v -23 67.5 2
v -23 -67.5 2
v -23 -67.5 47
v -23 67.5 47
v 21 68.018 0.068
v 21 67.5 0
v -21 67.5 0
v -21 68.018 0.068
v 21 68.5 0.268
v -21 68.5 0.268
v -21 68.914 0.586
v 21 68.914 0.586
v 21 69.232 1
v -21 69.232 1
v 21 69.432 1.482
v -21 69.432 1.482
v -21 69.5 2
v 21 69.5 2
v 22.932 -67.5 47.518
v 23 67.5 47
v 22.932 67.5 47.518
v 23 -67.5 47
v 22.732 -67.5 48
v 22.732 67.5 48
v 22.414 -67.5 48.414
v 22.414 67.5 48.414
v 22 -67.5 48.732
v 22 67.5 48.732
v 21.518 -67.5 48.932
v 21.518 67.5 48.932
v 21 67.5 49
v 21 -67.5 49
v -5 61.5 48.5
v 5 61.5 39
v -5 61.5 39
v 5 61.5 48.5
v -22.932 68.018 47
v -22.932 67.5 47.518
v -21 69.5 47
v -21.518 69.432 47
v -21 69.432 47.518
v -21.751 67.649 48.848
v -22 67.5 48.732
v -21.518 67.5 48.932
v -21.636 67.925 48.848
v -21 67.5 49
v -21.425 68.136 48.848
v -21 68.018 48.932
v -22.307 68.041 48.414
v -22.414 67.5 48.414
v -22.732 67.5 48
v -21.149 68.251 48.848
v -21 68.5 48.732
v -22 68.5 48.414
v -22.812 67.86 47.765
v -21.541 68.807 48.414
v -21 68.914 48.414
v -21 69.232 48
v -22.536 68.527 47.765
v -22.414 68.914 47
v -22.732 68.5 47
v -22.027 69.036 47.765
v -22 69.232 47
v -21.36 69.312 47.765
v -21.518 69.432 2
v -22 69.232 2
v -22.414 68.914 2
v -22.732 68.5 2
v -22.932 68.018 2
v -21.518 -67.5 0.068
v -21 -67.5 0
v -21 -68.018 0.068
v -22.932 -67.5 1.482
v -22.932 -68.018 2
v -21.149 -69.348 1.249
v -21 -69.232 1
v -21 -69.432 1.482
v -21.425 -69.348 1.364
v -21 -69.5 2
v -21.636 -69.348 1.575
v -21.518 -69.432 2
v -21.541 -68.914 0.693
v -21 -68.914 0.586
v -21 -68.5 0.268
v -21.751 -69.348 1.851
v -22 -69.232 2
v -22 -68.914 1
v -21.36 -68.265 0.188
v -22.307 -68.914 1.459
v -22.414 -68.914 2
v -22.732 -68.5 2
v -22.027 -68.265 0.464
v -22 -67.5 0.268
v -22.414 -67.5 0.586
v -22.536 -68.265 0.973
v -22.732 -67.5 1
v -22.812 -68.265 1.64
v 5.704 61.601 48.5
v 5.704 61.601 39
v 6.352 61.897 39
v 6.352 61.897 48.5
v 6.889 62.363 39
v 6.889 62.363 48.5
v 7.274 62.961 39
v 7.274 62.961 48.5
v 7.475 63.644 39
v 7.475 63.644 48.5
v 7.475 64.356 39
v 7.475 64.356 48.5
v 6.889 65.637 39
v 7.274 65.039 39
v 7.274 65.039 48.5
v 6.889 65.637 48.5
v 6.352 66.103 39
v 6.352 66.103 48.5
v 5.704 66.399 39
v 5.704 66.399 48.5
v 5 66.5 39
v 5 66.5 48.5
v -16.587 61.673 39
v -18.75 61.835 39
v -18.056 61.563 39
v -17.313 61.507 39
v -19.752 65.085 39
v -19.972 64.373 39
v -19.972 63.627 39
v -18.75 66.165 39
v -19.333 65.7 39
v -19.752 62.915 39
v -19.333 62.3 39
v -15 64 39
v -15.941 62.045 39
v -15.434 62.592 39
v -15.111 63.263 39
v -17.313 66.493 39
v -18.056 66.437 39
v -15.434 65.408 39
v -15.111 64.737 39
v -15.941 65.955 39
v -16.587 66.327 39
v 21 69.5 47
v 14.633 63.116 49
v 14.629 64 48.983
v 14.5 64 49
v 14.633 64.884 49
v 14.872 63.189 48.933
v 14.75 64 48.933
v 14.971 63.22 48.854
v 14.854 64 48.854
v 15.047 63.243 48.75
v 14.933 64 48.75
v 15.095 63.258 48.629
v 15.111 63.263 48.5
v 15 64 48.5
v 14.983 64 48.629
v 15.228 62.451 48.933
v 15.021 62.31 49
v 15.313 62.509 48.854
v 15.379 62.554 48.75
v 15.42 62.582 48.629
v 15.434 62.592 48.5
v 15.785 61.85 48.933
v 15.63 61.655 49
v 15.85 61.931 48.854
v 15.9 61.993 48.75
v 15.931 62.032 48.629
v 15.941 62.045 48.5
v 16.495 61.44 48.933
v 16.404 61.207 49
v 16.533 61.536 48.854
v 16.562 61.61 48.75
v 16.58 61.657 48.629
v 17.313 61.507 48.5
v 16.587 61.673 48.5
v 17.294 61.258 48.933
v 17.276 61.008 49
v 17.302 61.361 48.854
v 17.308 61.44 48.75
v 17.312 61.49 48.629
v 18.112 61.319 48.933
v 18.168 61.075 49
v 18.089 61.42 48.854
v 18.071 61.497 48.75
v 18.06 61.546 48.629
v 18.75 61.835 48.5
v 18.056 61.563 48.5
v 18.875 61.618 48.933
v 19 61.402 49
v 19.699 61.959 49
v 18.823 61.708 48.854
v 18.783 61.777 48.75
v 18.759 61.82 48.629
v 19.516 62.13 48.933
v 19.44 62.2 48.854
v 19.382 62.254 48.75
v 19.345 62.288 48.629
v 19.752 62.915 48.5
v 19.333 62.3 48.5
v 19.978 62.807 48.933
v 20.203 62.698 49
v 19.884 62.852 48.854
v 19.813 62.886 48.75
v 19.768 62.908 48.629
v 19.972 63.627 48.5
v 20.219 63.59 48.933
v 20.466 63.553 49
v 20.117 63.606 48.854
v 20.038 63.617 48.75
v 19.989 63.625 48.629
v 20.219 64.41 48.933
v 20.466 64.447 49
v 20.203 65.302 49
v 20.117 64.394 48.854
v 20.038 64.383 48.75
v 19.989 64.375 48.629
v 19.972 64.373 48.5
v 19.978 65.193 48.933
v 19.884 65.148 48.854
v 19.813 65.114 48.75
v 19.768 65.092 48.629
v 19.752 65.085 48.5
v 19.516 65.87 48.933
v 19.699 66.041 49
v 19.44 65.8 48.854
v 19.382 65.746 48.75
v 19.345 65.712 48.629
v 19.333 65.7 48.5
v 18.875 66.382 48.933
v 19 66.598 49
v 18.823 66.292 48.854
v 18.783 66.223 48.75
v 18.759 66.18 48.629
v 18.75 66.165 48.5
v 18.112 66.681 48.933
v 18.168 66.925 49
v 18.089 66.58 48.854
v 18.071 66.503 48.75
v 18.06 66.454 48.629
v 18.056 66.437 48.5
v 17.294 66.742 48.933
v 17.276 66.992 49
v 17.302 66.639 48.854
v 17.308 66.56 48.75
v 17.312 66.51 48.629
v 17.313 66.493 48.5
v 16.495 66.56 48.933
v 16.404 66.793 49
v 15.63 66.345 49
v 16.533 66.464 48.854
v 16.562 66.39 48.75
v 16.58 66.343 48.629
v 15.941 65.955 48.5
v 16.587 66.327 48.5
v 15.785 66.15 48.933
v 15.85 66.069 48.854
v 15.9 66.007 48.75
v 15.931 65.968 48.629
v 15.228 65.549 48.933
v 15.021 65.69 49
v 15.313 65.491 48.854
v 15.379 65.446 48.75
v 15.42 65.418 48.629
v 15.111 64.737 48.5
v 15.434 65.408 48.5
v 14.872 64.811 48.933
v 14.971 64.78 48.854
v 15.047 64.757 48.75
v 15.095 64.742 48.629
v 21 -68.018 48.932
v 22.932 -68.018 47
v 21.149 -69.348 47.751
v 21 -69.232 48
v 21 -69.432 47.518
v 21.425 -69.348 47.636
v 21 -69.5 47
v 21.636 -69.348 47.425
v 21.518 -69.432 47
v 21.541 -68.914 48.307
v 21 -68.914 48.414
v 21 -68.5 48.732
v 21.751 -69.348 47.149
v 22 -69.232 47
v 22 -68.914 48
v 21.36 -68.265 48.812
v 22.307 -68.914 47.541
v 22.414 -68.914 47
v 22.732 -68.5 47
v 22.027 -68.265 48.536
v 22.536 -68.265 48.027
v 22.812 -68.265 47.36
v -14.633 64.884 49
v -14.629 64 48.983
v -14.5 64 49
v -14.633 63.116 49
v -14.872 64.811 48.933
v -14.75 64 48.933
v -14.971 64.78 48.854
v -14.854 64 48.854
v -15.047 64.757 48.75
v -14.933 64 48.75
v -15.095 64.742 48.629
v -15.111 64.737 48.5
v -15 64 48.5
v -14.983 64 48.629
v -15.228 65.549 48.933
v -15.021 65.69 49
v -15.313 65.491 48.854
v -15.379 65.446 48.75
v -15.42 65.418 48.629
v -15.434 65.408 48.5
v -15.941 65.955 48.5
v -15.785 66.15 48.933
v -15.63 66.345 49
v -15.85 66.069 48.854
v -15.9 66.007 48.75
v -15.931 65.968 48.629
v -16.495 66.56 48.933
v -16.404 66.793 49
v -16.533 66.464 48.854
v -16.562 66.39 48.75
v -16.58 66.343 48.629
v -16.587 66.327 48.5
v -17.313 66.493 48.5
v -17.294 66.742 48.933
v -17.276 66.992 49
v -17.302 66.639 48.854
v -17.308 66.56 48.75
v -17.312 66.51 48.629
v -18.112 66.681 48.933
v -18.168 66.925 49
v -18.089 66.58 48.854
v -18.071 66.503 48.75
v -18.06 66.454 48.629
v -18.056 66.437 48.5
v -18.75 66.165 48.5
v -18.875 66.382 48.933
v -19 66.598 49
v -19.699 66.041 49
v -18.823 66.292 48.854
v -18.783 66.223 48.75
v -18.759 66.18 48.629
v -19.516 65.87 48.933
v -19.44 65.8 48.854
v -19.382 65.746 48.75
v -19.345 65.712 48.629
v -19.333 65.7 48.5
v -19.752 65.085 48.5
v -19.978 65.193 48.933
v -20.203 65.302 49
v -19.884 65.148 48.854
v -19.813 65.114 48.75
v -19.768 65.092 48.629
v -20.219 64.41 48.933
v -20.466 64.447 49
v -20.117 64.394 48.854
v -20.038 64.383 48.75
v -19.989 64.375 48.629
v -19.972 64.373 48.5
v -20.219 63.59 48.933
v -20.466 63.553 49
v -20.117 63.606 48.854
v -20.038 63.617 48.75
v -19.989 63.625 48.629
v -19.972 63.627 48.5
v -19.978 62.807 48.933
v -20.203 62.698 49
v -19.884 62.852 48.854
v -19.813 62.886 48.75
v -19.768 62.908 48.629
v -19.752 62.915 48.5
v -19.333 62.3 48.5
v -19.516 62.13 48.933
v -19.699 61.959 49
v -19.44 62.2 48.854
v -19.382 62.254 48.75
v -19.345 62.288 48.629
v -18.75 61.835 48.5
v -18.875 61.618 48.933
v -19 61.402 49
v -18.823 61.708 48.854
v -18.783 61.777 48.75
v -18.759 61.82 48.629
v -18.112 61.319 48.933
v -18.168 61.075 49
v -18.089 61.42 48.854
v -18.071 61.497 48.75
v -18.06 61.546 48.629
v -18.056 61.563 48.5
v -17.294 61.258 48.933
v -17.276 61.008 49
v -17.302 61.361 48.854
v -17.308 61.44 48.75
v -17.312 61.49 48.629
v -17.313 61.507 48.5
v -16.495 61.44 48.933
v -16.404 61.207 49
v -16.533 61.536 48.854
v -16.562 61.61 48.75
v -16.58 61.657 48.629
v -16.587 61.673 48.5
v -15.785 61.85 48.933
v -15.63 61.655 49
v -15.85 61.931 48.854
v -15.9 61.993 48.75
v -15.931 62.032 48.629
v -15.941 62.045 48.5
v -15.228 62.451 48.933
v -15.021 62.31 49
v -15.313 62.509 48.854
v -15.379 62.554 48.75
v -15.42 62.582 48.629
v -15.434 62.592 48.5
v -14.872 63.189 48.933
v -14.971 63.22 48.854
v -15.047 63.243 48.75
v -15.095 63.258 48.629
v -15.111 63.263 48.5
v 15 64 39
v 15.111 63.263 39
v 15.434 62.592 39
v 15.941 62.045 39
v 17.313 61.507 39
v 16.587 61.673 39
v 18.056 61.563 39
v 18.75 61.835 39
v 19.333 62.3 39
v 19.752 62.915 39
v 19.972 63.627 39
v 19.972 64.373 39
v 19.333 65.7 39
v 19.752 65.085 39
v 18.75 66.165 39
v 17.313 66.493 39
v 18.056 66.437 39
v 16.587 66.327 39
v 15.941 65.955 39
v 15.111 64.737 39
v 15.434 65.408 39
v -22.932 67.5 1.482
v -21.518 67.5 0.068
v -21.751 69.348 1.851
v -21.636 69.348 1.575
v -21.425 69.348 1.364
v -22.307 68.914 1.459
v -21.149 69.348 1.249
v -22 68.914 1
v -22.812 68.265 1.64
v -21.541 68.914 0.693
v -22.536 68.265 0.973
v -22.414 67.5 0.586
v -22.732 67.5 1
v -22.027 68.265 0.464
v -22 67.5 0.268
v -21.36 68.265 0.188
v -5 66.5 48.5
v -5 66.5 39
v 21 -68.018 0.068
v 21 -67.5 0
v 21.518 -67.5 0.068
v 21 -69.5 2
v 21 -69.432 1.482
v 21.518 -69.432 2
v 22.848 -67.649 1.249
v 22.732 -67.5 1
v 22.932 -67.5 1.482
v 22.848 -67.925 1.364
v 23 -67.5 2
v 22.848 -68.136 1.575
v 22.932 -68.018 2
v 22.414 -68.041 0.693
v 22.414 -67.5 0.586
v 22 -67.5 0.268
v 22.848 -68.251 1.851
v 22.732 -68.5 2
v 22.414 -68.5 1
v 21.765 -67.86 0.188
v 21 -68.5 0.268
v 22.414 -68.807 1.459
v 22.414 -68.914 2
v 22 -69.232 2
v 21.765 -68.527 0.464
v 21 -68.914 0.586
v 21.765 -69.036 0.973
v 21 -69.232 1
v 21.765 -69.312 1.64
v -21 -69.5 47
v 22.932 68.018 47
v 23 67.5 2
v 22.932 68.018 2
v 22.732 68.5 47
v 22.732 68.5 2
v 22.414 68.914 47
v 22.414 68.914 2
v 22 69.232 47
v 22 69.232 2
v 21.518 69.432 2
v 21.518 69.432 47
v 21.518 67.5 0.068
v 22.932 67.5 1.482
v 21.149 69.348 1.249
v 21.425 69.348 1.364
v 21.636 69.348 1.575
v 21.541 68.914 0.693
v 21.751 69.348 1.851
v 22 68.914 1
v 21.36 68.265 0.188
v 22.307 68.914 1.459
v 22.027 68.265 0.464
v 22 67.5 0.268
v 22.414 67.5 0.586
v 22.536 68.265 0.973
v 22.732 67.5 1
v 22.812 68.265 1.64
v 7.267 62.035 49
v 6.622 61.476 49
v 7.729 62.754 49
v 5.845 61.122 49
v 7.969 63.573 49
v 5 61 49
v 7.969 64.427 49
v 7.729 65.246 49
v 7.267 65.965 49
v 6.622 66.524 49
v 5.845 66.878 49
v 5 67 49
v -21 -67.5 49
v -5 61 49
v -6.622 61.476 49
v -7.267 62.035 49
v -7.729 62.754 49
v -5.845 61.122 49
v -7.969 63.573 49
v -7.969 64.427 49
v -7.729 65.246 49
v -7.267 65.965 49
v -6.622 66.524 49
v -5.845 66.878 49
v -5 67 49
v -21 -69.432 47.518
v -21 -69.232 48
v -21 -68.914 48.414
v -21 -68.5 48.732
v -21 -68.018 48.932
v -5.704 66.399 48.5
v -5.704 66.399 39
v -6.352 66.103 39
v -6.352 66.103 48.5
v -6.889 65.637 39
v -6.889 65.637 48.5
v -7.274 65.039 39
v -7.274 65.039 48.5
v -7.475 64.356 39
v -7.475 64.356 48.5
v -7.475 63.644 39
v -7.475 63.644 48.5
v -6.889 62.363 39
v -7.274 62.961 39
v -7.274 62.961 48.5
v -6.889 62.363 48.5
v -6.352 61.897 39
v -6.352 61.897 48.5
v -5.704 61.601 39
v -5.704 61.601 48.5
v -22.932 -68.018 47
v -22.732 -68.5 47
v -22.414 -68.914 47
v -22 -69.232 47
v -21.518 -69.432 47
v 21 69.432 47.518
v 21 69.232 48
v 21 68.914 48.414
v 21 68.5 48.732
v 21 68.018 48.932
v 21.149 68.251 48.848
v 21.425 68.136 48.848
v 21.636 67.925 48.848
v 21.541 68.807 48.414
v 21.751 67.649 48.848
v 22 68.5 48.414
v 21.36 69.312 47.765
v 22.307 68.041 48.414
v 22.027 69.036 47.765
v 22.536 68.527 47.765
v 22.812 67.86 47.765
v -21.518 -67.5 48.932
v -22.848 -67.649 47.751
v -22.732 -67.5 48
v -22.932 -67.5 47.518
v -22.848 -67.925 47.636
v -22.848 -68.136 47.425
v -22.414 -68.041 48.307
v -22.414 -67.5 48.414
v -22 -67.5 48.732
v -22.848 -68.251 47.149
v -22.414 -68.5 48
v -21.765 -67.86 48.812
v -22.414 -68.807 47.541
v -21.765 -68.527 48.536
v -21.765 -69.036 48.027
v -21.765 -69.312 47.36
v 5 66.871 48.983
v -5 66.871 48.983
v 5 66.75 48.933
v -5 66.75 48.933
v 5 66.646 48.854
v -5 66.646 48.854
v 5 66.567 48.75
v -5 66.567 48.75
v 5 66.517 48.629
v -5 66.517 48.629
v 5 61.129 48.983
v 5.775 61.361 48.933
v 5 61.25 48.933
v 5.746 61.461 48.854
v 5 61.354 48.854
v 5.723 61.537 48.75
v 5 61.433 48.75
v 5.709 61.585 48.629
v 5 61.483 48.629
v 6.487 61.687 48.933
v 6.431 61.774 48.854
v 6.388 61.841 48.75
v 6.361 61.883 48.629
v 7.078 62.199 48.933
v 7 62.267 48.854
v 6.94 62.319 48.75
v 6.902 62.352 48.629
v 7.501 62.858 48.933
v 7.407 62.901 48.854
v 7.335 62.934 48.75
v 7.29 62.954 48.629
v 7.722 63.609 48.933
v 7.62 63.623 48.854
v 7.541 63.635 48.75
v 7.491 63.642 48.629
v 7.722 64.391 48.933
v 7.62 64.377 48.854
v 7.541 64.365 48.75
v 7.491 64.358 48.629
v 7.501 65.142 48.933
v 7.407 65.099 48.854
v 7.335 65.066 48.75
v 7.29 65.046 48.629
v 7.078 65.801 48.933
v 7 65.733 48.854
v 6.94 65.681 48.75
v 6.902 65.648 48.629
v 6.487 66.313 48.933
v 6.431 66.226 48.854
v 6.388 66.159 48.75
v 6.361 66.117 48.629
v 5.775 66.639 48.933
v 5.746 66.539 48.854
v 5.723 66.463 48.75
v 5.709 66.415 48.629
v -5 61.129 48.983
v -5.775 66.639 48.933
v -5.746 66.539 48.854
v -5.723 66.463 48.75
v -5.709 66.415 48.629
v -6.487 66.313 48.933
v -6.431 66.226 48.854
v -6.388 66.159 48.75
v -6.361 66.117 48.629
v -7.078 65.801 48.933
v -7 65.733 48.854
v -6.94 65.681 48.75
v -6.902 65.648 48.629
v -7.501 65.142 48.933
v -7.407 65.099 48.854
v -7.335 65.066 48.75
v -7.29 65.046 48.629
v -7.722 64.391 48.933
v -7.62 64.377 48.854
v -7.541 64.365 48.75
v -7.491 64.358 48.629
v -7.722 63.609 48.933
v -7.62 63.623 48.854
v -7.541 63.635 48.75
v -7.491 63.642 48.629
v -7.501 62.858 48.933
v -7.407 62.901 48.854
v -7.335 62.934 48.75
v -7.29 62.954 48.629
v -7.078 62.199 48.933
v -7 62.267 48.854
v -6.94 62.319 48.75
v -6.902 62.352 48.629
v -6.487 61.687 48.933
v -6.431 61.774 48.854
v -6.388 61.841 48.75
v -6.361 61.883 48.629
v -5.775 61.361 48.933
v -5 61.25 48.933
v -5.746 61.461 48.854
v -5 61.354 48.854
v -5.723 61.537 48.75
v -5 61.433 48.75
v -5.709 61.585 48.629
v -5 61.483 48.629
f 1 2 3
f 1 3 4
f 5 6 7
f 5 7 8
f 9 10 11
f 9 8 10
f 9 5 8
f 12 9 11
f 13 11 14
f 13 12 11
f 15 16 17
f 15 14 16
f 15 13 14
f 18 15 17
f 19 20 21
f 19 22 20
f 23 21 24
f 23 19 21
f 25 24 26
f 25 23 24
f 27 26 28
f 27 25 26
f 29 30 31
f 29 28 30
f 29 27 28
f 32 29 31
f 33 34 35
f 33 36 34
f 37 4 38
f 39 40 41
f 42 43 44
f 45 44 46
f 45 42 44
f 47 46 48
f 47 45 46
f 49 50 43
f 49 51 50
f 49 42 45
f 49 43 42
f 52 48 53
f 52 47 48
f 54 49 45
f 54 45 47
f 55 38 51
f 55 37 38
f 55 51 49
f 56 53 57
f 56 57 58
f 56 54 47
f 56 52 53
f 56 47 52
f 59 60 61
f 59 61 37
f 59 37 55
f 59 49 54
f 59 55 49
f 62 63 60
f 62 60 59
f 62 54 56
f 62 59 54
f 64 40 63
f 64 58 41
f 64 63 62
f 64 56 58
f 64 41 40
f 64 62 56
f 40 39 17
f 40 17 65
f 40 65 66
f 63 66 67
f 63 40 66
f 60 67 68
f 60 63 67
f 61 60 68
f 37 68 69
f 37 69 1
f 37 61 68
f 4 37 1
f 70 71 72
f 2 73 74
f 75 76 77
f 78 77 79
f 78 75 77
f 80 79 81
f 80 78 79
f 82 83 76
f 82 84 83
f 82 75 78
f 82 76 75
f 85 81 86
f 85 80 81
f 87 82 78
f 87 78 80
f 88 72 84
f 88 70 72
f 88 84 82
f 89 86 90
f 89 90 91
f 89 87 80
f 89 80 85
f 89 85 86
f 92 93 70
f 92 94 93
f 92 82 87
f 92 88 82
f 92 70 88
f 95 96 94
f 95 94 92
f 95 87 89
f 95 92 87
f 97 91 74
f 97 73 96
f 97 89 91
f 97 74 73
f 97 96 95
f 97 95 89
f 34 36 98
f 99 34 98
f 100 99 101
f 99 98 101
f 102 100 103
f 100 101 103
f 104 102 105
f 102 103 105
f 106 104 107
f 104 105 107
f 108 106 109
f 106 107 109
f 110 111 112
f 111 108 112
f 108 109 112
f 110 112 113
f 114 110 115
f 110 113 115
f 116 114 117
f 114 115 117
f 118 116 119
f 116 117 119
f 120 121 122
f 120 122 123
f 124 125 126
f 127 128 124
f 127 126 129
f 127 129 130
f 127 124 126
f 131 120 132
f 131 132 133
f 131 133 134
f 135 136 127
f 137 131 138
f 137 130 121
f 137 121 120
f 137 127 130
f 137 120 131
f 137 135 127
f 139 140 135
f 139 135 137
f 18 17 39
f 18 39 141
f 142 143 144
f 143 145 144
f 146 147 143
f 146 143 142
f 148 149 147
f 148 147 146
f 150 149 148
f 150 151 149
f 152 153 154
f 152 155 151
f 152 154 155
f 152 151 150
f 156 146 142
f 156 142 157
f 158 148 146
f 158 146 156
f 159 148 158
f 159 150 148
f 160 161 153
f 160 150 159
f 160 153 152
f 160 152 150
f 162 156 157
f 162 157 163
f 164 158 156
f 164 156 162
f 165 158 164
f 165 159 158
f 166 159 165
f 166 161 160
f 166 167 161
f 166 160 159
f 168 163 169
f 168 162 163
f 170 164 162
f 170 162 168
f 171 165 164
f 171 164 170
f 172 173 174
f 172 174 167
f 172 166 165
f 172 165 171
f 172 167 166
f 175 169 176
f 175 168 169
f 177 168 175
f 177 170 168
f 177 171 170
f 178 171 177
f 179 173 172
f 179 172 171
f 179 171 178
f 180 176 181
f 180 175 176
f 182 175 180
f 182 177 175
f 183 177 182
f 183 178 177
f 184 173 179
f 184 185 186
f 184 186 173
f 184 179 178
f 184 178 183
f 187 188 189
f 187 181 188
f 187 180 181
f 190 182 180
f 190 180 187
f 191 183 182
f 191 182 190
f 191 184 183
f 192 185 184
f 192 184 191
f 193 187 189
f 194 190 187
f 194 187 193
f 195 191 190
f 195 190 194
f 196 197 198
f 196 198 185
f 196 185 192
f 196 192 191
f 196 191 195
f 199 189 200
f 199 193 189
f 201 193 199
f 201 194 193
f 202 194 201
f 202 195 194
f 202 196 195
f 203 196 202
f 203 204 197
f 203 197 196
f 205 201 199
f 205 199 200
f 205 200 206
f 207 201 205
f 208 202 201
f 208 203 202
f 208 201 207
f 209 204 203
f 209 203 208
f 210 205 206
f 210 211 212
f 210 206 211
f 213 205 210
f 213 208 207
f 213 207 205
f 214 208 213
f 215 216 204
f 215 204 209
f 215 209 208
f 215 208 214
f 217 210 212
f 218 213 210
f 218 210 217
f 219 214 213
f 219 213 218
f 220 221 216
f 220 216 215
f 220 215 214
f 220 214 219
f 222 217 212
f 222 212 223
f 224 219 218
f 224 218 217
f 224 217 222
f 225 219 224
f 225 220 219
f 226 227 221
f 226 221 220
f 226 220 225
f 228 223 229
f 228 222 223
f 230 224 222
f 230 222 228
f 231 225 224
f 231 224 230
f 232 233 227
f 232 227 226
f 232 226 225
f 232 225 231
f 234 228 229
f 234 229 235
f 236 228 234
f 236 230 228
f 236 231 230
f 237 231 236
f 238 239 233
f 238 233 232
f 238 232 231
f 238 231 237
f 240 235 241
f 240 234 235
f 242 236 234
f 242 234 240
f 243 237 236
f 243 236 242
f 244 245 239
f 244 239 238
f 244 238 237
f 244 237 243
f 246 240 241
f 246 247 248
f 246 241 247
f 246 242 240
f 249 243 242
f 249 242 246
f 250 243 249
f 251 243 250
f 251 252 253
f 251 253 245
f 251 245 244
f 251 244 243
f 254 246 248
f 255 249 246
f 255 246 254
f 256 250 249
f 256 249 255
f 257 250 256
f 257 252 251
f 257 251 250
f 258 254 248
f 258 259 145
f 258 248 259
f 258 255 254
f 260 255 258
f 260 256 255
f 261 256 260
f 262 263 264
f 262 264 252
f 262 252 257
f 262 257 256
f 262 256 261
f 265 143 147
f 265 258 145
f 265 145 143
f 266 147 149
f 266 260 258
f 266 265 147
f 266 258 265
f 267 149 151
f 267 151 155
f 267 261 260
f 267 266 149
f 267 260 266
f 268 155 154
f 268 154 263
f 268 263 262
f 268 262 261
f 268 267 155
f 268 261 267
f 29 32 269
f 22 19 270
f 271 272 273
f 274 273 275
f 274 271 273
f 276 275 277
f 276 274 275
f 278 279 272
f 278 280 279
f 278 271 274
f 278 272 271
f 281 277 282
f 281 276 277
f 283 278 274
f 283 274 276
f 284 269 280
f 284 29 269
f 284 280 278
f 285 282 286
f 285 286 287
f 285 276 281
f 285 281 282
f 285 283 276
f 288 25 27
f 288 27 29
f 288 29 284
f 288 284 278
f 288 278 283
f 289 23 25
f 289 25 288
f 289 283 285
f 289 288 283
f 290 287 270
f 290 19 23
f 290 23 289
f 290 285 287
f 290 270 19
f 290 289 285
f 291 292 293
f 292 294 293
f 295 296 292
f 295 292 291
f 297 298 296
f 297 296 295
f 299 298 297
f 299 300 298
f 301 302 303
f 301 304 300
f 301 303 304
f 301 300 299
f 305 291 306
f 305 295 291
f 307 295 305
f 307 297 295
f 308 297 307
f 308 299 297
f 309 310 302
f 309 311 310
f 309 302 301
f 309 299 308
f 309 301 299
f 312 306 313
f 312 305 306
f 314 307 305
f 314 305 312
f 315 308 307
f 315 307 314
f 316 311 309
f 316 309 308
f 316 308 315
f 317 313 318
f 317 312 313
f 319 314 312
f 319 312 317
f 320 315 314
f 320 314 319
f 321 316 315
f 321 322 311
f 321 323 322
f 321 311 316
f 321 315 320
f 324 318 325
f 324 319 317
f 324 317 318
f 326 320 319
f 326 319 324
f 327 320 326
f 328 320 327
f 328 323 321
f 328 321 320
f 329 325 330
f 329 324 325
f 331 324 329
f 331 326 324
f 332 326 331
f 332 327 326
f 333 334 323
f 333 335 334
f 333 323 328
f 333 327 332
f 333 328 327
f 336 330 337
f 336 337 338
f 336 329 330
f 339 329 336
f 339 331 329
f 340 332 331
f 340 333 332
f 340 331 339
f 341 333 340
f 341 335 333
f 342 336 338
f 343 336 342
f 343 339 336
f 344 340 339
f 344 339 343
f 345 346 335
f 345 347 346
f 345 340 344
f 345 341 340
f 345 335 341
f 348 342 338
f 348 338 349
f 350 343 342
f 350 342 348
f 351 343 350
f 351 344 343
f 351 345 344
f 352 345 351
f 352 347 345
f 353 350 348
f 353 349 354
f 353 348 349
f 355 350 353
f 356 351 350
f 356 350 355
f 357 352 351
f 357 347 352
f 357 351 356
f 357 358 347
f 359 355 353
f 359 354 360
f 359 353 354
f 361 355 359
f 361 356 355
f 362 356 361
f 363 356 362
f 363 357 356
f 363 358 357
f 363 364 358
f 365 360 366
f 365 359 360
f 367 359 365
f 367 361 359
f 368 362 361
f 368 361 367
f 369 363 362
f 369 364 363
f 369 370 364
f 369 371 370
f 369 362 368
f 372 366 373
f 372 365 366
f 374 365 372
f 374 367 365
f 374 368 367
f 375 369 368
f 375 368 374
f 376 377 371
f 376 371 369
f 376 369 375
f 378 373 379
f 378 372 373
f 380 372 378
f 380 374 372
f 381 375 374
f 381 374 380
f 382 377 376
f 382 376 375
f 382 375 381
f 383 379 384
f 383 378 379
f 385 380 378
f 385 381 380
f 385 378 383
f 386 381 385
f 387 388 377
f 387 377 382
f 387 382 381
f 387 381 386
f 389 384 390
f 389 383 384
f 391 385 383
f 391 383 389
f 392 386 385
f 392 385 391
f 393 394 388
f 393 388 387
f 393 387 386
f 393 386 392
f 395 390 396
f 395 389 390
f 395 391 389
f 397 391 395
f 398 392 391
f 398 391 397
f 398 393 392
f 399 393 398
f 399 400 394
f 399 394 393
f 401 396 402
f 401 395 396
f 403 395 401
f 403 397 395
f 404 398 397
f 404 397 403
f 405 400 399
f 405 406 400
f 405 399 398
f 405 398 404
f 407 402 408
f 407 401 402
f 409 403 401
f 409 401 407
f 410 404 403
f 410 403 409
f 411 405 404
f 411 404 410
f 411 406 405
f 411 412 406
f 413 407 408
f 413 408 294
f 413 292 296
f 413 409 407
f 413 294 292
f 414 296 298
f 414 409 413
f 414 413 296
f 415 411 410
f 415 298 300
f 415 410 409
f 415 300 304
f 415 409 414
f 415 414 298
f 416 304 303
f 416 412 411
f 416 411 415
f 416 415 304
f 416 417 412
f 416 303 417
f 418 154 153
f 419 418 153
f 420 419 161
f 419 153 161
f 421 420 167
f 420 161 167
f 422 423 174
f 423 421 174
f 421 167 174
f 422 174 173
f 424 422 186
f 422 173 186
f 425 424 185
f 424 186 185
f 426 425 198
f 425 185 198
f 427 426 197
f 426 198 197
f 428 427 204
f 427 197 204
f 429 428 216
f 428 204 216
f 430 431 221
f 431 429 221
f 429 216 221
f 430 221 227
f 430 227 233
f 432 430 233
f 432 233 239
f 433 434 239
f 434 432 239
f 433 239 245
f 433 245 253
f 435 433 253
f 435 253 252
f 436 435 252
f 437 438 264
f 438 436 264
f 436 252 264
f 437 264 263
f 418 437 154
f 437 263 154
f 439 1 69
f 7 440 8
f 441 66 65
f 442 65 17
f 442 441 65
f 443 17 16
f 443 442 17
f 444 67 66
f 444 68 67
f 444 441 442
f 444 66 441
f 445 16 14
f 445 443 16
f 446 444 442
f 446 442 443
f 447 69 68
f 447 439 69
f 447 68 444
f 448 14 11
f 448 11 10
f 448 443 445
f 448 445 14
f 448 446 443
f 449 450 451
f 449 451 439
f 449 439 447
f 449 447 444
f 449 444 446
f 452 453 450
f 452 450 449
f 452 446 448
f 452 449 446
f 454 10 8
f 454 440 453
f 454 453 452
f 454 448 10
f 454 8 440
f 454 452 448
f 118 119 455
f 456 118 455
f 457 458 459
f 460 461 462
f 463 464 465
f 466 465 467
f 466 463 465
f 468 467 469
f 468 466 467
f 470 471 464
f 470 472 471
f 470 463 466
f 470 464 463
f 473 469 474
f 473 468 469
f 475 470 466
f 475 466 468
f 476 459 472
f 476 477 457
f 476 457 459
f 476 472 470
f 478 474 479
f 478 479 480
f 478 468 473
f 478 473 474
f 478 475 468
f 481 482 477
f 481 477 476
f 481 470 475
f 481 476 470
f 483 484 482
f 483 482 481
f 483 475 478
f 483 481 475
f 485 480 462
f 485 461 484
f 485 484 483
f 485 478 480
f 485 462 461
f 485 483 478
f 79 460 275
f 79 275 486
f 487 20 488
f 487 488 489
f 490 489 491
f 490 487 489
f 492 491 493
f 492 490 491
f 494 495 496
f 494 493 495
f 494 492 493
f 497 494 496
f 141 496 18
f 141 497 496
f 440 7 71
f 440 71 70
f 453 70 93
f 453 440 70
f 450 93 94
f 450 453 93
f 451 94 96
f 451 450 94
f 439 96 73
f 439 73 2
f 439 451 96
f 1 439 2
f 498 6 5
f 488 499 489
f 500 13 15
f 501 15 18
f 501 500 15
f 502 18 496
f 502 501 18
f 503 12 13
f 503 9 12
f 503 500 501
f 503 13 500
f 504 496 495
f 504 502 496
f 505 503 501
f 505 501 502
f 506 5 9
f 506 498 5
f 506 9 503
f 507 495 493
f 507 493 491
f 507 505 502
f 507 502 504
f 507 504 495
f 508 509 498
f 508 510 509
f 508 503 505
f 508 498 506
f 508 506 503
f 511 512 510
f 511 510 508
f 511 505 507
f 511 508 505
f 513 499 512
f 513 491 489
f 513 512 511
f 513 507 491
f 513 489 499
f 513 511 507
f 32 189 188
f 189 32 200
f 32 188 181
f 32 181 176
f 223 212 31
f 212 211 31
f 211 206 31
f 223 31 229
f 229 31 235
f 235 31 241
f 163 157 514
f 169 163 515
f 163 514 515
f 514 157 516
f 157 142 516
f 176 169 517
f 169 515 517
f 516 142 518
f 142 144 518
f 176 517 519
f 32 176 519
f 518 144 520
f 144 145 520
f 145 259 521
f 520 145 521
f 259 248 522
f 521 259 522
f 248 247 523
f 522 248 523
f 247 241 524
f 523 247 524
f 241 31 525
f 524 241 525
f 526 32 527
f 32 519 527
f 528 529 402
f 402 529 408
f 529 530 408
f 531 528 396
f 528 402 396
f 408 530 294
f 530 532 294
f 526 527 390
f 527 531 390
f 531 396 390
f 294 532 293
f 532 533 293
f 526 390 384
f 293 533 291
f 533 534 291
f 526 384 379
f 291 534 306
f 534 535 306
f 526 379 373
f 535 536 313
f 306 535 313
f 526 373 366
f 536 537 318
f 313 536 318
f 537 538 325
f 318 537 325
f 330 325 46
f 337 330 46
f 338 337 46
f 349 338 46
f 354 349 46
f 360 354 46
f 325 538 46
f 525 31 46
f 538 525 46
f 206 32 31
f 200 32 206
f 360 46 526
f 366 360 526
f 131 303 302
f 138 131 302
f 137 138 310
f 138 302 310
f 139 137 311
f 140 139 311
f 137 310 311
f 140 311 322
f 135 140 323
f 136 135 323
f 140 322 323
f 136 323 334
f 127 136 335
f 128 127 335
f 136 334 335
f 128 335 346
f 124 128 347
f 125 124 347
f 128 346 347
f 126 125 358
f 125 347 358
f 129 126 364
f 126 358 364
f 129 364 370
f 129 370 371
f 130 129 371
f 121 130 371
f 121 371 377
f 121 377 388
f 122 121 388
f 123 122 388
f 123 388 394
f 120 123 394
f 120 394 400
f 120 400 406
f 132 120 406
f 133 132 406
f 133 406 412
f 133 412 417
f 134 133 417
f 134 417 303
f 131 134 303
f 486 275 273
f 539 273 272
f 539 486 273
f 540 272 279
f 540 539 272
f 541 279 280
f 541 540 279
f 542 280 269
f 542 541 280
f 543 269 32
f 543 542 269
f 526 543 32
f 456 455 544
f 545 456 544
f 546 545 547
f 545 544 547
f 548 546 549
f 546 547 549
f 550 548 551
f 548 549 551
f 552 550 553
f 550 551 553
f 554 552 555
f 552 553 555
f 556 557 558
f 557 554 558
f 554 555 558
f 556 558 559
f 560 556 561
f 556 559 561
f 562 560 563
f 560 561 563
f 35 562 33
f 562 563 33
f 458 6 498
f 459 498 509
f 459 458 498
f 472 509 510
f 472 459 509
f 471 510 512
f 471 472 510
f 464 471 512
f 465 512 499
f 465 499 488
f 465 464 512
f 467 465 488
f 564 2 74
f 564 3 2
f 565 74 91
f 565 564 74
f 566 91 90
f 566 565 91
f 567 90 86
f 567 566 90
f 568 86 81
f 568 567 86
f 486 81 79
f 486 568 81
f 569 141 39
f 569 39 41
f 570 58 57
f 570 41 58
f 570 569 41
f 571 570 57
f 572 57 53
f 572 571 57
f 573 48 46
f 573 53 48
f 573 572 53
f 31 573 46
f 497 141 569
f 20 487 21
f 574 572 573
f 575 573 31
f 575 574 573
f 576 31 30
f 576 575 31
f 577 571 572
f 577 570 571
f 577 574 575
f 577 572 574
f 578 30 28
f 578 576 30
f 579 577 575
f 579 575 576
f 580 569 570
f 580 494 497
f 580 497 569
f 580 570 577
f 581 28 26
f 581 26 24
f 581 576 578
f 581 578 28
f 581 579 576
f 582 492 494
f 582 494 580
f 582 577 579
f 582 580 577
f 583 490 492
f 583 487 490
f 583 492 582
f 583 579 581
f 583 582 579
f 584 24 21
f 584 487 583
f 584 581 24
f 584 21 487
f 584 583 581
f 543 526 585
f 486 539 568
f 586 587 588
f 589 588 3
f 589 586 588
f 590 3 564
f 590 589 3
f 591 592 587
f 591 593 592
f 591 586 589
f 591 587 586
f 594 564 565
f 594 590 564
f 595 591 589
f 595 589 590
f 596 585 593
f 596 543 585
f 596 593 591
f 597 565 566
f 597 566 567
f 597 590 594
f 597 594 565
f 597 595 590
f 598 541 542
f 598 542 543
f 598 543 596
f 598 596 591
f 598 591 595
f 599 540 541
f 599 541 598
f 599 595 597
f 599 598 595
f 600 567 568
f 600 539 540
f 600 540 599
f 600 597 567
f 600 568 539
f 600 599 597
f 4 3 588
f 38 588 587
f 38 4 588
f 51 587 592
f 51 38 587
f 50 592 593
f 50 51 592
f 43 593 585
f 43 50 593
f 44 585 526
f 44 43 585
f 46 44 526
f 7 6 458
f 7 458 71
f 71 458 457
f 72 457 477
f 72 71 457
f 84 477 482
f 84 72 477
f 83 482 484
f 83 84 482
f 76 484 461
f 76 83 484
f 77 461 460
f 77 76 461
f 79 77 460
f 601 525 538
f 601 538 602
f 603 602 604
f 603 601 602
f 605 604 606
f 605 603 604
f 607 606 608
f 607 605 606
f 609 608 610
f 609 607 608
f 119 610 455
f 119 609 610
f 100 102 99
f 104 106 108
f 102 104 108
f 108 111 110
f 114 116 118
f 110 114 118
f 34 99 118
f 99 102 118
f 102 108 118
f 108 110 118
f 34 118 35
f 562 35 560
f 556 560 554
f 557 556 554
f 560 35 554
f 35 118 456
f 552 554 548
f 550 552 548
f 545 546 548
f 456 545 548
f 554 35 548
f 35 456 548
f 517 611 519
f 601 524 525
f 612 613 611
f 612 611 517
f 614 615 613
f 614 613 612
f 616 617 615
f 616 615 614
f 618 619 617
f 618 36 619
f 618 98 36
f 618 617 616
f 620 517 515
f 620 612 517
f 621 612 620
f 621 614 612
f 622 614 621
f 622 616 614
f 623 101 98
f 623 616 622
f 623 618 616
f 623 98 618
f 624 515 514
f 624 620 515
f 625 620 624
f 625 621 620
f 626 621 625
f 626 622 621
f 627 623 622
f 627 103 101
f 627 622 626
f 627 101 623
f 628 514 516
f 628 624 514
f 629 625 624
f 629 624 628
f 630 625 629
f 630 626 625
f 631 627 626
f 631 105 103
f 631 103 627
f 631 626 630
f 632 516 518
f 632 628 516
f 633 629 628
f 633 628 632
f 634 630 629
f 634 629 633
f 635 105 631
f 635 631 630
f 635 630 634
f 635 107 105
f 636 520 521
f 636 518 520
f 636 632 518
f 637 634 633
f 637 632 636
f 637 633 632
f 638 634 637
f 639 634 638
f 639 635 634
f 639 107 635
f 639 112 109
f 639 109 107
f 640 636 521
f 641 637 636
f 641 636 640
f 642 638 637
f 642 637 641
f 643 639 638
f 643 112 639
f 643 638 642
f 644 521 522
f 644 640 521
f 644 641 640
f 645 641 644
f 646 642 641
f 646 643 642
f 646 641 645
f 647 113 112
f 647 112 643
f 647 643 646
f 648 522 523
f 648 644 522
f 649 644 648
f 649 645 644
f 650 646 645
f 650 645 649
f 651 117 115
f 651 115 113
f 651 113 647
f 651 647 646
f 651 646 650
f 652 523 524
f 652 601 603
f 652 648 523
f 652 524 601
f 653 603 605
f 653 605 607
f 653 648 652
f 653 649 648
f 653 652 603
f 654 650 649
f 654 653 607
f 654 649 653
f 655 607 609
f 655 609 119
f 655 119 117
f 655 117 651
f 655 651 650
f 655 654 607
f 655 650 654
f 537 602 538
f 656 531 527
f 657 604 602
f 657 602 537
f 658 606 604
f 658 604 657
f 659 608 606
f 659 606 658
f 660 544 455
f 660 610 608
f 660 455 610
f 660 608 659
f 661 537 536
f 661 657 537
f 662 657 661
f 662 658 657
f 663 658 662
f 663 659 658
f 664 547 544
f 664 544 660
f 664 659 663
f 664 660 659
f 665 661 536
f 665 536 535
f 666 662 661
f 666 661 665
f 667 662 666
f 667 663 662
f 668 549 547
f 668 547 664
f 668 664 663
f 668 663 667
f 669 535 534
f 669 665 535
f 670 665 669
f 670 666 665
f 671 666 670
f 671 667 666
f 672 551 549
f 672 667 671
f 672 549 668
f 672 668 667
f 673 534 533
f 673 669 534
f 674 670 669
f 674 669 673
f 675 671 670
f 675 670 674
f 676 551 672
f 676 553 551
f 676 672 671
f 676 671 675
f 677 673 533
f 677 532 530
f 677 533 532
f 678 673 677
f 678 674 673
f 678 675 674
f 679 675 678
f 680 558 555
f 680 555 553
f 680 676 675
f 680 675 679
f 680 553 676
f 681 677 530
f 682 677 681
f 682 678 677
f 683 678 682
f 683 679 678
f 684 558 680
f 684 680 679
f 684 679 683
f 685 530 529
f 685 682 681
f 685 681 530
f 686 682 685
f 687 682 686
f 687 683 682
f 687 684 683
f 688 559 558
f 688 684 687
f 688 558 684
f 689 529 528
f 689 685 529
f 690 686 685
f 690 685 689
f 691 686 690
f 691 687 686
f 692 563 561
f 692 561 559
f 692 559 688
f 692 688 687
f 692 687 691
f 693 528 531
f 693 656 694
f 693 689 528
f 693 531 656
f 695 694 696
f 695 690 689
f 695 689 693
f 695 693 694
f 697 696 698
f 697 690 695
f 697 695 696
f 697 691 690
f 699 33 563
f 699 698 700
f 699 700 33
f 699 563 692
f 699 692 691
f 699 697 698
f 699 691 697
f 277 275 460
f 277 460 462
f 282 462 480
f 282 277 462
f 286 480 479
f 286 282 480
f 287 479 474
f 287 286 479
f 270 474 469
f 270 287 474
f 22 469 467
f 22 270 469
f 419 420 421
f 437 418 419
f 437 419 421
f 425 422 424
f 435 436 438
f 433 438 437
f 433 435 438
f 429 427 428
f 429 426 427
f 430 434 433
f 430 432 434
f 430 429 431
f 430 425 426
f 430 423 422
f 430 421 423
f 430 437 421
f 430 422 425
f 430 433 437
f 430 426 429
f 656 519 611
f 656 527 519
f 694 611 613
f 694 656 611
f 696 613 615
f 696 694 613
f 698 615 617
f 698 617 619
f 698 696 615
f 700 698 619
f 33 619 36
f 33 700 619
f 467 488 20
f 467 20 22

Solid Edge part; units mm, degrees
sketch "Sketch1" plane through (0, 0, 0) normal (0, 0, 1) x (1, 0, 0)
  line L0 (23, -69.5) -> (-23, -69.5)
  line L1 (-23, -69.5) -> (-23, 69.5)
  line L2 (-23, 69.5) -> (23, 69.5)
  line L3 (23, 69.5) -> (23, -69.5)
  dimension "D1" = 139
  dimension "D2" = 46
extrude "Protrusion1" add sketch "Sketch1" along normal blind 49
fillet "Verrundung_2" radius 2 12 edges at (-23, 0, 0) (0, -69.5, 0) (23, 0, 0) (0, 69.5, 0) (23, 69.5, 24.5) (-23, 69.5, 24.5) (0, 69.5, 49) (23, 0, 49) (23, -69.5, 24.5) (0, -69.5, 49) (-23, -69.5, 24.5) (-23, 0, 49)
sketch "Sketch2" plane through (0, 0, 49) normal (0, 0, 1) x (1, 0, 0)
  circle A0 centre (-17.5, 64) radius 2.5
  dimension "D1" = 5
  dimension "D2" = 1
  dimension "D3" = 1
extrude "Extrusionsausschnitt_1" cut sketch "Sketch2" against normal blind 10
mirror "Mirror1" about plane through (0, 0, 0) normal (1, 0, 0) of "Extrusionsausschnitt_1"
sketch "Sketch3" plane through (0, 0, 49) normal (0, 0, 1) x (-1, 0, 0)
  line L0 (-5, -61.5) -> (5, -61.5)
  line L1 (-5, -66.5) -> (5, -66.5)
  arc A0 (-5, -66.5) -> (-5, -61.5) centre (-5, -64) cw
  arc A1 (5, -61.5) -> (5, -66.5) centre (5, -64) cw
  dimension "D1" = 5
  dimension "D2" = 5
  dimension "D3" = 1
  dimension "D4" = 1
  dimension "D5" = 10
extrude "Extrusionsausschnitt_3" cut sketch "Sketch3" against normal blind 10
fillet "Verrundung_3" radius 0.5 6 edges at (-20, 64, 49) (-7.5, 64, 49) (0, 66.5, 49) (7.5, 64, 49) (0, 61.5, 49) (20, 64, 49)
